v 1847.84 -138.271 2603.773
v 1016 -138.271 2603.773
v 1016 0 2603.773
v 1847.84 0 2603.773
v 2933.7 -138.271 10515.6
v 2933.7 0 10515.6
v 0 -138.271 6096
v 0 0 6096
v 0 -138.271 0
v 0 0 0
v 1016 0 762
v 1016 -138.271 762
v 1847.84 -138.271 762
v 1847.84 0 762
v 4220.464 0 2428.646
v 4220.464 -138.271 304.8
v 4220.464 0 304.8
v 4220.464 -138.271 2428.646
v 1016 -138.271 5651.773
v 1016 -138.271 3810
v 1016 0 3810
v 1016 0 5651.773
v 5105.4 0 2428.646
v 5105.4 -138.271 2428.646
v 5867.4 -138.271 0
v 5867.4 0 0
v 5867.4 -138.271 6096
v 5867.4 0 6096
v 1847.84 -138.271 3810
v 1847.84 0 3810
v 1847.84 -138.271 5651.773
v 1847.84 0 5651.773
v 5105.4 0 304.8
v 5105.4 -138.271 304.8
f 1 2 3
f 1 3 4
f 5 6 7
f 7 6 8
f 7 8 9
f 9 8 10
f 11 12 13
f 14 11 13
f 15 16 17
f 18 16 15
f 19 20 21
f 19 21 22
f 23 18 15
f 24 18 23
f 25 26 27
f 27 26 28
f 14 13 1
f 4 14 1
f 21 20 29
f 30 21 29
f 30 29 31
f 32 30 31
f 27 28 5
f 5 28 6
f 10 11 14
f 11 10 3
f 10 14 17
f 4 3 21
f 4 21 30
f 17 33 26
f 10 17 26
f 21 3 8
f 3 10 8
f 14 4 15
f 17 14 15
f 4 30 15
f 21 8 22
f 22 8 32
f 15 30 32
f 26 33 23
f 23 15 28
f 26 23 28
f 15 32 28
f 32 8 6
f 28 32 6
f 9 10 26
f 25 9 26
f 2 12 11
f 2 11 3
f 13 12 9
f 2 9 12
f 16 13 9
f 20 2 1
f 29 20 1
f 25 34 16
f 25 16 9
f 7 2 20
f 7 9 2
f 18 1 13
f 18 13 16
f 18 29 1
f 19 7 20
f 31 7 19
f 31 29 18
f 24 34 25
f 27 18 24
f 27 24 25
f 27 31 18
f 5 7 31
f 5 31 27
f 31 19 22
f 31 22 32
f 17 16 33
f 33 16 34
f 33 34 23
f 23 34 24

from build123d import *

# Parameters (mm, degrees)
F1_DEPTH = 138.27125
F2_W     = 831.83984
F2_H     = 1841.77305
F2_W_2   = 884.936
F2_H_2   = 2123.8464
F3_DEPTH = 138.27225


with BuildPart() as f1:
    # F0 (on Front) → F1 (new body)
    with BuildSketch(Plane.XZ):
        Polygon((0, 6096), (0, 0), (5867.4, 0), (5867.4, 6096), (2933.7, 10515.6), align=None)
    extrude(amount=F1_DEPTH)

    # F2 (on face) → F3 (cut, through all)
    with BuildSketch(Plane.XZ.offset(138.27125)):
        with Locations((1431.91992, 1682.886525)):
            Rectangle(F2_W, F2_H)
        with Locations((4662.932, 1366.7232)):
            Rectangle(F2_W_2, F2_H_2)
        with Locations((1431.91992, 4730.886525)):
            Rectangle(F2_W, F2_H)
    extrude(amount=-F3_DEPTH, mode=Mode.SUBTRACT)


solid = f1.part
